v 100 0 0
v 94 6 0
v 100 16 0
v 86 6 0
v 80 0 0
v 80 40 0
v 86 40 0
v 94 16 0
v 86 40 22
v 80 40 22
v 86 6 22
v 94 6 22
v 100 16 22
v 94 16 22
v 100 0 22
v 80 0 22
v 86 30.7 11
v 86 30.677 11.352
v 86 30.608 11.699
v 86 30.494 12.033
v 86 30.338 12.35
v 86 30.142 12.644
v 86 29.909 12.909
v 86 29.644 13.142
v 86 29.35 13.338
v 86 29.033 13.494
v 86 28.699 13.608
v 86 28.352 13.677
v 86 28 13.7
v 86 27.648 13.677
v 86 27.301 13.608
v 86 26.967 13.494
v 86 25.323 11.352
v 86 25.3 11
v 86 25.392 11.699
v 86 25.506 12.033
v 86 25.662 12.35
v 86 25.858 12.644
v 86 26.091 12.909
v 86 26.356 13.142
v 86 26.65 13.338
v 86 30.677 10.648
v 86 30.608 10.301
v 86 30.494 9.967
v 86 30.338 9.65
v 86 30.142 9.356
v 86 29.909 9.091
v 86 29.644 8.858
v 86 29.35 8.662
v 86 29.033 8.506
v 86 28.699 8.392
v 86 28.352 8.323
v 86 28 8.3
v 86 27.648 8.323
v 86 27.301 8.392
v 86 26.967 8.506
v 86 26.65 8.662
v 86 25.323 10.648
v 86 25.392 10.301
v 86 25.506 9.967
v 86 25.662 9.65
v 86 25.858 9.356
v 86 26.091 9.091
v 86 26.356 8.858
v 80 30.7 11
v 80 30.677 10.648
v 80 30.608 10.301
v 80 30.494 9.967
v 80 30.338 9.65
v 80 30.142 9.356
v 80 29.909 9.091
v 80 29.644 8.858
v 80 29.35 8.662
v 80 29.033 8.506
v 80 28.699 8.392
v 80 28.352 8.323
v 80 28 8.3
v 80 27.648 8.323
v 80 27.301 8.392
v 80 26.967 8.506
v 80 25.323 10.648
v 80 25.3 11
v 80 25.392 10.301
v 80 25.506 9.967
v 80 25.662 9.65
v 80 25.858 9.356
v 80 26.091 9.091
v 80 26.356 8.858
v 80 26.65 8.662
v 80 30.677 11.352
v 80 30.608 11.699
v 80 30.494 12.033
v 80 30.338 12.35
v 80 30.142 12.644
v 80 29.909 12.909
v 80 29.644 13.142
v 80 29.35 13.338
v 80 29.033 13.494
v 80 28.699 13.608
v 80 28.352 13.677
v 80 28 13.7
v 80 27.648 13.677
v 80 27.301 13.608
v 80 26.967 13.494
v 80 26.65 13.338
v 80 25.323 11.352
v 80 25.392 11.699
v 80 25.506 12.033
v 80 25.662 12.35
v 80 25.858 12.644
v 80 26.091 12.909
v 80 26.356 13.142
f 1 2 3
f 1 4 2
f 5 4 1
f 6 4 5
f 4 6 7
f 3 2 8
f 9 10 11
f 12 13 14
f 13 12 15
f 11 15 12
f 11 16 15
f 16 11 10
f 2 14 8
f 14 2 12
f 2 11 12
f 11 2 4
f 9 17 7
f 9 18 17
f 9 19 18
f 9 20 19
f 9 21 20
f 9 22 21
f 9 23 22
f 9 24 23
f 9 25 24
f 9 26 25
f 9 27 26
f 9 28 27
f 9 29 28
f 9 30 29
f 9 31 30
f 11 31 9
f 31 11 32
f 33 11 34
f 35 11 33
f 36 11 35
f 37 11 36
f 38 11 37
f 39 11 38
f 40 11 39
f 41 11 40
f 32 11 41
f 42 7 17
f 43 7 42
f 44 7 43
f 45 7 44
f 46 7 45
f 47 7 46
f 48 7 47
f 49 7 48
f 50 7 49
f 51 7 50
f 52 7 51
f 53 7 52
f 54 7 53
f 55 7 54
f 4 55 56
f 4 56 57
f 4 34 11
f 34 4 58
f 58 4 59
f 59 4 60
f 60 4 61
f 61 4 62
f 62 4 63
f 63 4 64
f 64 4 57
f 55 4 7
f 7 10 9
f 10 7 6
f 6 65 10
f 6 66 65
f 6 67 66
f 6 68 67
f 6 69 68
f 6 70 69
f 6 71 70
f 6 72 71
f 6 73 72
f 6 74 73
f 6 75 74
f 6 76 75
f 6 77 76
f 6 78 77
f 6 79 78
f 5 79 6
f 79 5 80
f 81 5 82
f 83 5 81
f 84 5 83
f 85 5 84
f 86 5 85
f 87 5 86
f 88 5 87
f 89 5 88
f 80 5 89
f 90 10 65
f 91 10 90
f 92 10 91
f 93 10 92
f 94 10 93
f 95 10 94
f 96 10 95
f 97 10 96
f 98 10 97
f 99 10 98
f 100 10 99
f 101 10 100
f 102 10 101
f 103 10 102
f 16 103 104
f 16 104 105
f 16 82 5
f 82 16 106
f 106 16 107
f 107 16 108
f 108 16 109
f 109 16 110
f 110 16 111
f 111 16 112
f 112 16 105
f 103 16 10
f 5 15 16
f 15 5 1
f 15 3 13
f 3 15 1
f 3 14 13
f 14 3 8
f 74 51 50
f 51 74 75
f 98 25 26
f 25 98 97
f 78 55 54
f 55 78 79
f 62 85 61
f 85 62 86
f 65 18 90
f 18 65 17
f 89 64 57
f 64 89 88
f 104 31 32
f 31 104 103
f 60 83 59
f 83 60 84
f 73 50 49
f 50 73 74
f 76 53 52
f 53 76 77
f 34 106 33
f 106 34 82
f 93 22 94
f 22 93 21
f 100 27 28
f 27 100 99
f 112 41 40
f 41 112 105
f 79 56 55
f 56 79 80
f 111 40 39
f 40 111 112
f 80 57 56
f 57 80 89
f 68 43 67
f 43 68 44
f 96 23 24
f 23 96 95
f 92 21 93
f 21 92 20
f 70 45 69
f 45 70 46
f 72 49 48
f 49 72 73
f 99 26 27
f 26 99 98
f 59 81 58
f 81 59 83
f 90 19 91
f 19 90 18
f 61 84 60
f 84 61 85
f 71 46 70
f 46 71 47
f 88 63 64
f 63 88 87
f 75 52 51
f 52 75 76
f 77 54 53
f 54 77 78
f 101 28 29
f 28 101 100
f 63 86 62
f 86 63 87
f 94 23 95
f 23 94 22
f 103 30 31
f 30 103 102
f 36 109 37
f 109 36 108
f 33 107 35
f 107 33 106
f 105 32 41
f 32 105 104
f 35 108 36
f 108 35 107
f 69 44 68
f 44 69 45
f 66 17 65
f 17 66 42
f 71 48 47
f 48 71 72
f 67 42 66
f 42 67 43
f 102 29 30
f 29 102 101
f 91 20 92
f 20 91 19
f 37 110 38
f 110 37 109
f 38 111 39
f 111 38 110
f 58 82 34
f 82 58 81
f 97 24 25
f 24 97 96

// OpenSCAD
// @title Bucket Pannier Hooks (bike rack)
// @category Transport
// @material PETG or Nylon, 100% infill
// @print Flat as oriented (profile on bed), no supports
// @summary Two top hooks + one lower anti-sway hook. Bolt them to a plastic bucket or box to make a waterproof bicycle pannier for carrying water, food and tools.
// @use Bolt through the bucket wall with M5 bolts, large washers inside. Space the top hooks to match your rack rails. The lower hook goes on an elastic cord to the lower rack strut so the bucket can't bounce off. Keep each pannier under ~10kg and load both sides evenly.
// @variant 10mm rail | -D rail=10
// @variant 12mm rail | -D rail=12

rail = 10; w = 22; $fn = 48;
module hook2d() {
  difference() {
    union() {
      translate([0,0]) square([6, 60]);                   // back plate
      translate([0,60]) square([rail+12, 6]);             // top
      translate([rail+6, 60-rail*0.9]) square([6, rail*0.9+6]); // front lip
    }
    translate([6+rail/2, 60-rail/2+0.01]) circle(d=rail+0.6);
  }
}
module hook() {
  difference() {
    linear_extrude(w) hook2d();
    for (y=[15, 42]) translate([-1, y, w/2]) rotate([0,90,0]) cylinder(d=5.4, h=8);
  }
}
hook();
translate([40,0,0]) hook();
// lower anti-sway hook
translate([80,0,0]) difference() {
  linear_extrude(w) union() { square([6,40]); translate([0,0]) square([20,6]); translate([14,0]) square([6,16]); }
  translate([-1, 28, w/2]) rotate([0,90,0]) cylinder(d=5.4, h=8);
}
